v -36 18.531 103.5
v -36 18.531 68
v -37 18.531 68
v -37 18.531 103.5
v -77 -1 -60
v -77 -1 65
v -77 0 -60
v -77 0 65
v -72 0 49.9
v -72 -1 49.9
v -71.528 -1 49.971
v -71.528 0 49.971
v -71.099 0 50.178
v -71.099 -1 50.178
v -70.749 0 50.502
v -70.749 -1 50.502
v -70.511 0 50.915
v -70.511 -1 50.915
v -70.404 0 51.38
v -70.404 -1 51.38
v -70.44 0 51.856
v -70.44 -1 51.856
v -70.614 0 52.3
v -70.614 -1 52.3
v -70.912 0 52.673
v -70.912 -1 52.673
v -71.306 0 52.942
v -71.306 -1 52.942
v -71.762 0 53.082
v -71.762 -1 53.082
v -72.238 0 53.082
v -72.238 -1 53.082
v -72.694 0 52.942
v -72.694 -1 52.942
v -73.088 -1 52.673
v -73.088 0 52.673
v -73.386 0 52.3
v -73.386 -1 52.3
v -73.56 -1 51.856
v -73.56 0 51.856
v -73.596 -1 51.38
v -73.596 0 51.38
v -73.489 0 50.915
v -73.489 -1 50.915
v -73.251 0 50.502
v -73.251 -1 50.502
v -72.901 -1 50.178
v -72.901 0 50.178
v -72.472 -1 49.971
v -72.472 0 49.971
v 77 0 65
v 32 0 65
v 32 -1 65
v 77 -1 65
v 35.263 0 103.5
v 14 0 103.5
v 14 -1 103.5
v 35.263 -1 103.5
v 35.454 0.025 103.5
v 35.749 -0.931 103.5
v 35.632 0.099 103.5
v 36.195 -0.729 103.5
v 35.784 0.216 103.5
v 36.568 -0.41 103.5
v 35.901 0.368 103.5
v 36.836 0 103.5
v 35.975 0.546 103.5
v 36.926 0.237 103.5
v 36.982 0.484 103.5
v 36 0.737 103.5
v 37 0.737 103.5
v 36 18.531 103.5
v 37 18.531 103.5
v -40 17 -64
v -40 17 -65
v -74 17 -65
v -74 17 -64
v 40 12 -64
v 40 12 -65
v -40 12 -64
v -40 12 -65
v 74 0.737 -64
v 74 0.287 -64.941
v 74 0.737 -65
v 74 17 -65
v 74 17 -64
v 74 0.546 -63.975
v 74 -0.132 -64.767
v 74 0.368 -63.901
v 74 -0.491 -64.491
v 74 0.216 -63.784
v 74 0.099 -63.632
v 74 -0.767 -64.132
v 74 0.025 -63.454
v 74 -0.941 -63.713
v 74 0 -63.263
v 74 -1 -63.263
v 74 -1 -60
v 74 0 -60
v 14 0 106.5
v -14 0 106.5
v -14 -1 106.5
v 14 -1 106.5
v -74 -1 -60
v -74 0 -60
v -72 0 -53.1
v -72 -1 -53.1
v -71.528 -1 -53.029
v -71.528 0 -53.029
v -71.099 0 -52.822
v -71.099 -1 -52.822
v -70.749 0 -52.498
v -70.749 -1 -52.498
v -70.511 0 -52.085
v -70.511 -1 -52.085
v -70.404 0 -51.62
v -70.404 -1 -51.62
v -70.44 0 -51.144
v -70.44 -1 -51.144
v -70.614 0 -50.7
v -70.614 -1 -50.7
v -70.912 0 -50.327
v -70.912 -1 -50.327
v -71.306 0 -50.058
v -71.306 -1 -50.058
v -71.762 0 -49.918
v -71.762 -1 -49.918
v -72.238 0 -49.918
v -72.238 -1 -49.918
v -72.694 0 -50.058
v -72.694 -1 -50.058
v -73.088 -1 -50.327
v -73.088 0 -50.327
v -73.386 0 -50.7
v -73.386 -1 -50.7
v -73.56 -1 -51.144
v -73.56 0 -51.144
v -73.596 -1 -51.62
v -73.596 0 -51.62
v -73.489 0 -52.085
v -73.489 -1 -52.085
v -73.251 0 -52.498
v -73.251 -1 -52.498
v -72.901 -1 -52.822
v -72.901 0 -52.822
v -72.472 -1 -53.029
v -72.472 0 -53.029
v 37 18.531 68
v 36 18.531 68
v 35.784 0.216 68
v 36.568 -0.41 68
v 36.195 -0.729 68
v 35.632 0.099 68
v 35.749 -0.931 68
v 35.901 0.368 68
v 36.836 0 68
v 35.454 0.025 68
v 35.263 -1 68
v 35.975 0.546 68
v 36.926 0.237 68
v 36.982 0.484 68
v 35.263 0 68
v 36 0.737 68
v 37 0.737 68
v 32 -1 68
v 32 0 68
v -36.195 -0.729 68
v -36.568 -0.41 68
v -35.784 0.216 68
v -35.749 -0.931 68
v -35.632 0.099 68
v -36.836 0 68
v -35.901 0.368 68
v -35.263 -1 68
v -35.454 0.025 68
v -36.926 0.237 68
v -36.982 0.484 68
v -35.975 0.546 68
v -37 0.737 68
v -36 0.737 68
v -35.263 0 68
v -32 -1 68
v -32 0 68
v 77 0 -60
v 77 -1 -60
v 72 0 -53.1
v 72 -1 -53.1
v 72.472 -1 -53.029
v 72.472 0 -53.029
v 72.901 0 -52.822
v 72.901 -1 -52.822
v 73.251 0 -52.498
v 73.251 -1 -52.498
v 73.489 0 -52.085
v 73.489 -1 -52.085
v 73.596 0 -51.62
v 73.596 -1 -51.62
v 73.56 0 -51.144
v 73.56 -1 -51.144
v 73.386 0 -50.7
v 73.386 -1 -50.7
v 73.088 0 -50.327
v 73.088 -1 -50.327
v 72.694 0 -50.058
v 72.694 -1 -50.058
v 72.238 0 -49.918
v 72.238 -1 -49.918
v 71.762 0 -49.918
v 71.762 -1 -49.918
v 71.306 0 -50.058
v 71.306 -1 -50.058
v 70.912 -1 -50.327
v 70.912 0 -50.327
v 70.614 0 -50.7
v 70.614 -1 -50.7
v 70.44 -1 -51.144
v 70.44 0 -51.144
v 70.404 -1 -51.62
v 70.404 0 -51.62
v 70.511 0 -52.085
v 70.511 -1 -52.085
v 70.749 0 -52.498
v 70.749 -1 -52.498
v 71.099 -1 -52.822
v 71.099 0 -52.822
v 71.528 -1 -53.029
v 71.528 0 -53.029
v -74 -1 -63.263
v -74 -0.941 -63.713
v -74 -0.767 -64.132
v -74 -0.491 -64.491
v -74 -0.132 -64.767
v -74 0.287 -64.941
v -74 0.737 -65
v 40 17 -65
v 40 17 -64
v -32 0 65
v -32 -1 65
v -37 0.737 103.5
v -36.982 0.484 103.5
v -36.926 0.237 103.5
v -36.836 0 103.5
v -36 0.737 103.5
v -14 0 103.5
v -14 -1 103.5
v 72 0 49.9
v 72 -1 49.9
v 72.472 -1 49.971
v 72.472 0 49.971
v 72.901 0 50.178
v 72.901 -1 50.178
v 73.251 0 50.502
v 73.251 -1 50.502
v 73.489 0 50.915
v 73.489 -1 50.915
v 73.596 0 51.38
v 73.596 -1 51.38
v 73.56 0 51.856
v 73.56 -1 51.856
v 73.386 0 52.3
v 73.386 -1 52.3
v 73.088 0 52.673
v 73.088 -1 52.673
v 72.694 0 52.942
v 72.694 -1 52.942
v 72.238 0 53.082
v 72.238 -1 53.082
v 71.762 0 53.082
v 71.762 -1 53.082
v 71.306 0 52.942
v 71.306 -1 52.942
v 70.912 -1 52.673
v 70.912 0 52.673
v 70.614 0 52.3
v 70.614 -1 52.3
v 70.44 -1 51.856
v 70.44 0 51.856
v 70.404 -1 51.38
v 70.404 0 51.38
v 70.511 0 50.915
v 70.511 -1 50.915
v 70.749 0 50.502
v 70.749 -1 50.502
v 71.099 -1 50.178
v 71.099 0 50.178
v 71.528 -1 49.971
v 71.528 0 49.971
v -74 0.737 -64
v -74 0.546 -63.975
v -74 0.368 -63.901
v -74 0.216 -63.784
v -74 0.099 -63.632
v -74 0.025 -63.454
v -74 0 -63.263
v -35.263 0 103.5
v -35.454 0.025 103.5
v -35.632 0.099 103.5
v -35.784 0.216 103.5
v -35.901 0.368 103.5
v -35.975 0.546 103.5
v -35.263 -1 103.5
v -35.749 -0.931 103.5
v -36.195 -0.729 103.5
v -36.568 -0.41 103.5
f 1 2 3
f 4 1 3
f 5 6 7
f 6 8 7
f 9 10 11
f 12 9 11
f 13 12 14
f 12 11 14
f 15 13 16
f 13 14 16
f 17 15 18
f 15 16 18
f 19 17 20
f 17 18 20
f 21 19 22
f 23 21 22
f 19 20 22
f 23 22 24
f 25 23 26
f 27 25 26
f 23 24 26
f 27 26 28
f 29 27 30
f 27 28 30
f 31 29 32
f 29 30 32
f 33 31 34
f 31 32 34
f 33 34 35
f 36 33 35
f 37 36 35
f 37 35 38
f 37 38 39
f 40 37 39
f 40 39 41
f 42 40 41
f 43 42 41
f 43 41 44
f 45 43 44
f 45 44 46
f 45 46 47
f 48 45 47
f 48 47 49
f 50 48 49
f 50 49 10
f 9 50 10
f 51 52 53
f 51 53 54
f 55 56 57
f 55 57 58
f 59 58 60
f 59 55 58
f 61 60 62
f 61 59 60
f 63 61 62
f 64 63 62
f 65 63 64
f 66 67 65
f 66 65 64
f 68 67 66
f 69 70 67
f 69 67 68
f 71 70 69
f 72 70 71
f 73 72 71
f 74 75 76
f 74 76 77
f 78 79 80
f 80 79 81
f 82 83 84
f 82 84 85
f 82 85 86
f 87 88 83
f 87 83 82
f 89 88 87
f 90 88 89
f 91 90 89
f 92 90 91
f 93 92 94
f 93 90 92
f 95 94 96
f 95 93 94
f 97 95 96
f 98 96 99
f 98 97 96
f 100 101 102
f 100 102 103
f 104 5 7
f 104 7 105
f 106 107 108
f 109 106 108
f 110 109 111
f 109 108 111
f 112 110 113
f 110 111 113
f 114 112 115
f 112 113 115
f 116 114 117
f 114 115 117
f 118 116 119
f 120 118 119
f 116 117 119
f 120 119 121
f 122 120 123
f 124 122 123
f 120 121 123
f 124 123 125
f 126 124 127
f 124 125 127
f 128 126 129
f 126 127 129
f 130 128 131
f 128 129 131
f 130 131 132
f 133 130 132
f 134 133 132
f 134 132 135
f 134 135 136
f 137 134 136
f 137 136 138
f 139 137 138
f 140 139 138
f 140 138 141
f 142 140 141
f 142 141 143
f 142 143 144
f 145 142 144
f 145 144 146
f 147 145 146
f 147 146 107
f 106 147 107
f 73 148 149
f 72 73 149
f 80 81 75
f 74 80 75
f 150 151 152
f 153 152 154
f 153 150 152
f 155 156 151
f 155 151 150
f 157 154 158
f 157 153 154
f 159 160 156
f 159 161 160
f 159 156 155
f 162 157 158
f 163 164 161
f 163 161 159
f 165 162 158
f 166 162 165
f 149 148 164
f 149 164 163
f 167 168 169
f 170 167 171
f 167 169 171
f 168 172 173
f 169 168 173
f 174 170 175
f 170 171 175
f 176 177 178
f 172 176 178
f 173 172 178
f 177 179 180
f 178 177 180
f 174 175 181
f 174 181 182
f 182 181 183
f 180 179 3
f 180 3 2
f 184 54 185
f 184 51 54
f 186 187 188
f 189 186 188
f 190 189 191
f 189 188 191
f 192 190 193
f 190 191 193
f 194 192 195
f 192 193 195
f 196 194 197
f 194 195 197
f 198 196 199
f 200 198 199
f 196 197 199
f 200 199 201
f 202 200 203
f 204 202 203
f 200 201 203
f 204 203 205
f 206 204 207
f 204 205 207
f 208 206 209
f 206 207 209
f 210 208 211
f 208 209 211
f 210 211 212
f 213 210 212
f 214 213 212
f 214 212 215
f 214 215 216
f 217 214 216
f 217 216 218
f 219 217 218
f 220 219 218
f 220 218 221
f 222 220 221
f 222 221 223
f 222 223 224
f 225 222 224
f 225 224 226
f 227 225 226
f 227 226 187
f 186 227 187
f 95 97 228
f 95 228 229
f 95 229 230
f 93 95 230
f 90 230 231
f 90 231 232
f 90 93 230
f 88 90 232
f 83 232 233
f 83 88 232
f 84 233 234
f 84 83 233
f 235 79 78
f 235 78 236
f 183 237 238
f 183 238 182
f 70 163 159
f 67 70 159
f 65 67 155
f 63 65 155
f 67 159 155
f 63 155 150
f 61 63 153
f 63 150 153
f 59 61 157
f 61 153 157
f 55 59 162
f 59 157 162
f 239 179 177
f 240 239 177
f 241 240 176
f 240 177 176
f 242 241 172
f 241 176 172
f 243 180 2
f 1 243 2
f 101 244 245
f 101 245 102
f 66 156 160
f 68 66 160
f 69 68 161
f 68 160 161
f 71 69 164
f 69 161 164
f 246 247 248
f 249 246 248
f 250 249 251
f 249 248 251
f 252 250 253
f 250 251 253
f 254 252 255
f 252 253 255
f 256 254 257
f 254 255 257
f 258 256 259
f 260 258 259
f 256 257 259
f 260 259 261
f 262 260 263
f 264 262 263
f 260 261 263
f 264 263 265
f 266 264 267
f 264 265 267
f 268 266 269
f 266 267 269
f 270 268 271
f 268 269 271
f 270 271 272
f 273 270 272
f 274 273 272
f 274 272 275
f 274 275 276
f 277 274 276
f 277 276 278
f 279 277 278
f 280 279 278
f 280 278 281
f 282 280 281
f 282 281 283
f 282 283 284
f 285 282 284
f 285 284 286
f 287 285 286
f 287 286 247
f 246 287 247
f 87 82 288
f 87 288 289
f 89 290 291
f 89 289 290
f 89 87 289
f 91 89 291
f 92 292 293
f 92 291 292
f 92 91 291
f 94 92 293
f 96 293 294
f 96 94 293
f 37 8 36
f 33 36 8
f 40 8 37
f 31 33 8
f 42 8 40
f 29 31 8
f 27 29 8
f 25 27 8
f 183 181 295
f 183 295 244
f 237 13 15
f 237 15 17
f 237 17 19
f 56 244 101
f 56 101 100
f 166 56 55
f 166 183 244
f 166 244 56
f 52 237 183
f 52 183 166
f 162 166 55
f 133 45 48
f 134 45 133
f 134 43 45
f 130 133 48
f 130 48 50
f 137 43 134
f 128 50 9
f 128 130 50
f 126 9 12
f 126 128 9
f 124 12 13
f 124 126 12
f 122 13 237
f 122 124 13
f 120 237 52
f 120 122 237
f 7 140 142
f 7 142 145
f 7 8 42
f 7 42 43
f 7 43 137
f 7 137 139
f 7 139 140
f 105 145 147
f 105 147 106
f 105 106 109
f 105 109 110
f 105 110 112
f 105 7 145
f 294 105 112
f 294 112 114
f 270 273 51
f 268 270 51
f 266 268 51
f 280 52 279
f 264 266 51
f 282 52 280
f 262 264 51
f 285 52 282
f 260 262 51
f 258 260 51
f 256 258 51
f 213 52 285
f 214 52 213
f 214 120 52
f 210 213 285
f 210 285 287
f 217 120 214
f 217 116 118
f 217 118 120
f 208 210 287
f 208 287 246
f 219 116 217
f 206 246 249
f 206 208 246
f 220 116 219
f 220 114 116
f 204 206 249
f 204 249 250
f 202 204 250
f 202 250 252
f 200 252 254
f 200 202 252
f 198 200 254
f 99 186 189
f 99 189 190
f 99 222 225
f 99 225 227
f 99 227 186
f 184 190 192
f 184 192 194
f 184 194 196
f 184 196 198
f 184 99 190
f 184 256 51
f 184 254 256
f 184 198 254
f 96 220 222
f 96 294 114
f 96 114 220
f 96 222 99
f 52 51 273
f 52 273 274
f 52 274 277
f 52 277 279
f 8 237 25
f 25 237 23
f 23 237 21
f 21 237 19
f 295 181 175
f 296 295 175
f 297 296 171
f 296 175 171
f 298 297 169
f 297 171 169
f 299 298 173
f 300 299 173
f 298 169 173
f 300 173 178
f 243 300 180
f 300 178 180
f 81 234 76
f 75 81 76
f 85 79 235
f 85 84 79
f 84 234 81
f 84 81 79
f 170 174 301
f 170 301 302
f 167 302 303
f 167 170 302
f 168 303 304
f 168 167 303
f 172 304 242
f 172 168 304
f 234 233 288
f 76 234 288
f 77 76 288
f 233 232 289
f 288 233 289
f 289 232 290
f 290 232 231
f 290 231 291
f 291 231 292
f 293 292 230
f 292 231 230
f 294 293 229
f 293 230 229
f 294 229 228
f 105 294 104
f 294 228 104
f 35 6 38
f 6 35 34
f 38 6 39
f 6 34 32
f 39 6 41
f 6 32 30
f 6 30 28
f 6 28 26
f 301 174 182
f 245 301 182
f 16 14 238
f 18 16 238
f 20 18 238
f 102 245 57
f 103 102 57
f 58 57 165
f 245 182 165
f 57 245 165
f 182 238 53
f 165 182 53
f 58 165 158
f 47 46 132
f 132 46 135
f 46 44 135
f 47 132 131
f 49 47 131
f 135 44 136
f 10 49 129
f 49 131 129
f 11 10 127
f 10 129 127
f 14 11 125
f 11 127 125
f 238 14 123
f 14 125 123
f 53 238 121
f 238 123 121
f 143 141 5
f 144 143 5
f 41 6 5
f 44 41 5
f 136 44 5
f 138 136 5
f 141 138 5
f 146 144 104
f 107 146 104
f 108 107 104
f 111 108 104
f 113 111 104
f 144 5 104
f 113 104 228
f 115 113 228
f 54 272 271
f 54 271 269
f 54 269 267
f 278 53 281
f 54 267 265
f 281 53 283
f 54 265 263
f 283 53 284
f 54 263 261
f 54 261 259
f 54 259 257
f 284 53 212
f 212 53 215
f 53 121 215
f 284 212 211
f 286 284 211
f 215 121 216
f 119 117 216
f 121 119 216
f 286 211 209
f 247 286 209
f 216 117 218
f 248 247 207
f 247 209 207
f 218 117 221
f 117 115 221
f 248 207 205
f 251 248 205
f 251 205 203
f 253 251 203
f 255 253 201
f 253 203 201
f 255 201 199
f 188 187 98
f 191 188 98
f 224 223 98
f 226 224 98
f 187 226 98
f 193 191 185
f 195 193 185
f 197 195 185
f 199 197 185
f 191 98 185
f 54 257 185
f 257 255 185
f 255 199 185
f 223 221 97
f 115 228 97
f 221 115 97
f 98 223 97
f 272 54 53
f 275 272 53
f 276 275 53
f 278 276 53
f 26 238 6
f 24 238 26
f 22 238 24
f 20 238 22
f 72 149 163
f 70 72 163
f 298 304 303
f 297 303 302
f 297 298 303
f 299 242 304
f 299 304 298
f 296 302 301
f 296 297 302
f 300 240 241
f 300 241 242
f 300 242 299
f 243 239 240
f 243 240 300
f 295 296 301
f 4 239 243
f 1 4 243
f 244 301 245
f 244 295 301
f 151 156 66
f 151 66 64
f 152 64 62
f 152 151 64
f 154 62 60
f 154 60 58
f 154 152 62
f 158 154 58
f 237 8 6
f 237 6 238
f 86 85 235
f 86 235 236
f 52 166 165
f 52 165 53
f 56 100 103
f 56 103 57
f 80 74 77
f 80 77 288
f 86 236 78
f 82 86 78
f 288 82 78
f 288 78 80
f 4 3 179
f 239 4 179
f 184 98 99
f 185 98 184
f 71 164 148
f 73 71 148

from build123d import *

# Parameters (mm, degrees)
SM_BASE_FLANGE_1_DEPTH           = 1
OTHER_START                      = 68
OTHER_4_DEPTH                    = 35.5
OTHER_4_2_DEPTH                  = 35.5
CUT_EXTRUDE_1_REACH              = 134.863
SKETCH_10_R                      = 1.6
SM_EDGE_FLANGE_1_STRIP_W         = 5.4732
SM_EDGE_FLANGE_1_STRIP_H         = 1
SM_EDGE_FLANGE_1_STRIP_CUT_DEPTH = 154
SM_EDGE_FLANGE_1_DEPTH           = 154
SKETCH_14_W                      = 9.264116278
SKETCH_14_H                      = 12.510211191
CUT_EXTRUDE_2_DEPTH              = 133.863464967
CUT_EXTRUDE_3_REACH              = 190.904
SKETCH_15_W                      = 80
SKETCH_15_H                      = 29.662460086


# Read off the part's stored shape, not the designer's step: 绘制的折弯4
# Sheet-metal steps are written as plain solids
with BuildPart() as part:
    # Sketch 1 → 基体-法兰1 (new body)
    with BuildSketch(Plane(origin=(0, 0, 0), x_dir=(1, 0, 0), z_dir=(0, 1, 0))):
        Polygon((0.031889959, 65), (-77, 65), (-77, -65), (-32, -65), (-32, -68), (-55, -68), (-55, -103.5), (-14, -103.5), (-14, -106.5), (14, -106.5), (14, -103.5), (55, -103.5), (55, -68), (32, -68), (32, -65), (77, -65), (77, 65), align=None)
    extrude(amount=-SM_BASE_FLANGE_1_DEPTH)

    # Other 4 outline → Other 4 (cut)
    with BuildSketch(Plane.XY.offset(OTHER_START)):
        with BuildLine():
            Line((-55, -1), (-35.2634, -1))
            ThreePointArc((-35.2634, -1), (-36.195226164, -0.728828115), (-36.83604109, 0))
            Line((-36.83604109, 0), (-55, 0))
            Line((-55, 0), (-55, -1))
        make_face()
        with BuildLine():
            ThreePointArc((36.83604109, 0), (36.195226164, -0.728828115), (35.2634, -1))
            Line((35.2634, -1), (55, -1))
            Line((55, -1), (55, 0))
            Line((55, 0), (36.83604109, 0))
        make_face()
    extrude(amount=OTHER_4_DEPTH, mode=Mode.SUBTRACT)

    # Other 4 2 outline → Other 4 2 (add)
    with BuildSketch(Plane.XY.offset(OTHER_START)):
        with BuildLine():
            ThreePointArc((-37, 0.7366), (-36.958514757, 0.359286442), (-36.83604109, 0))
            Line((-36.83604109, 0), (-35.2634, 0))
            ThreePointArc((-35.2634, 0), (-35.784254855, 0.215745145), (-36, 0.7366))
            Line((-36, 0.7366), (-36, 18.530753262))
            Line((-36, 18.530753262), (-37, 18.530753262))
            Line((-37, 18.530753262), (-37, 0.7366))
        make_face()
        with BuildLine():
            Line((35.2634, 0), (36.83604109, 0))
            ThreePointArc((36.83604109, 0), (36.958514757, 0.359286442), (37, 0.7366))
            Line((37, 0.7366), (37, 18.530753262))
            Line((37, 18.530753262), (36, 18.530753262))
            Line((36, 18.530753262), (36, 0.7366))
            ThreePointArc((36, 0.7366), (35.784254855, 0.215745145), (35.2634, 0))
        make_face()
    extrude(amount=OTHER_4_2_DEPTH)

    # 草图10 → 切除-拉伸1 (cut, up to next)
    with BuildSketch(Plane.XZ.offset(1), mode=Mode.PRIVATE) as cut_extrude_1_sk1:
        with Locations(Location((-72, -51.5, 0), (0, 0, 270))):
            Circle(SKETCH_10_R)
    cut_extrude_1_tool1 = extrude(cut_extrude_1_sk1.sketch, amount=-CUT_EXTRUDE_1_REACH, mode=Mode.PRIVATE) & part.part
    # 草图10 → 切除-拉伸1 (cut, up to next)
    with BuildSketch(Plane.XZ.offset(1), mode=Mode.PRIVATE) as cut_extrude_1_sk2:
        with Locations(Location((-72, 51.5, 0), (0, 0, 270))):
            Circle(SKETCH_10_R)
    cut_extrude_1_tool2 = extrude(cut_extrude_1_sk2.sketch, amount=-CUT_EXTRUDE_1_REACH, mode=Mode.PRIVATE) & part.part
    # 草图10 → 切除-拉伸1 (cut, up to next)
    with BuildSketch(Plane.XZ.offset(1), mode=Mode.PRIVATE) as cut_extrude_1_sk3:
        with Locations(Location((72, -51.5, 0), (0, 0, 270))):
            Circle(SKETCH_10_R)
    cut_extrude_1_tool3 = extrude(cut_extrude_1_sk3.sketch, amount=-CUT_EXTRUDE_1_REACH, mode=Mode.PRIVATE) & part.part
    # 草图10 → 切除-拉伸1 (cut, up to next)
    with BuildSketch(Plane.XZ.offset(1), mode=Mode.PRIVATE) as cut_extrude_1_sk4:
        with Locations(Location((72, 51.5, 0), (0, 0, 270))):
            Circle(SKETCH_10_R)
    cut_extrude_1_tool4 = extrude(cut_extrude_1_sk4.sketch, amount=-CUT_EXTRUDE_1_REACH, mode=Mode.PRIVATE) & part.part
    add(cut_extrude_1_tool1.solids().sort_by_distance((-72, -1, -51.5))[0], mode=Mode.SUBTRACT)
    add(cut_extrude_1_tool2.solids().sort_by_distance((-72, -1, 51.5))[0], mode=Mode.SUBTRACT)
    add(cut_extrude_1_tool3.solids().sort_by_distance((72, -1, -51.5))[0], mode=Mode.SUBTRACT)
    add(cut_extrude_1_tool4.solids().sort_by_distance((72, -1, 51.5))[0], mode=Mode.SUBTRACT)

    # 边线-法兰1 strip (across the edge) → 边线-法兰1 strip cut (cut)
    with BuildSketch(Plane(origin=(77, 0, -65), x_dir=(0, 0, 1), z_dir=(-1, 0, 0))):
        with Locations((-1, -0.5)):
            Rectangle(SM_EDGE_FLANGE_1_STRIP_W, SM_EDGE_FLANGE_1_STRIP_H)
    extrude(amount=SM_EDGE_FLANGE_1_STRIP_CUT_DEPTH, mode=Mode.SUBTRACT)

    # 边线-法兰1 section (across the edge) → 边线-法兰1 (add)
    with BuildSketch(Plane(origin=(77, 0, -65), x_dir=(0, 0, 1), z_dir=(-1, 0, 0))):
        with BuildLine():
            Line((0, 0.7366), (0, 17))
            Line((0, 17), (1, 17))
            Line((1, 17), (1, 0.7366))
            ThreePointArc((1, 0.7366), (1.215745145, 0.215745145), (1.7366, 0))
            Line((1.7366, 0), (1.7366, -1))
            ThreePointArc((1.7366, -1), (0.508638364, -0.491361636), (0, 0.7366))
        make_face()
    extrude(amount=SM_EDGE_FLANGE_1_DEPTH)

    # 草图14 → 切除-拉伸2 (cut, through all)
    with BuildSketch(Plane.XZ.offset(1)):
        with Locations((-78.632058139, -66.255105596)):
            Rectangle(SKETCH_14_W, SKETCH_14_H)
        with Locations((78.632058139, -66.255105596)):
            Rectangle(SKETCH_14_W, SKETCH_14_H)
    extrude(amount=-CUT_EXTRUDE_2_DEPTH, mode=Mode.SUBTRACT)

    # 草图15 → 切除-拉伸3 (cut, up to next)
    with BuildSketch(Plane(origin=(0, 0, -65), x_dir=(-1, 0, 0), z_dir=(0, 0, -1)), mode=Mode.PRIVATE) as cut_extrude_3_sk1:
        with Locations((0, 26.831230043)):
            Rectangle(SKETCH_15_W, SKETCH_15_H)
    cut_extrude_3_tool1 = extrude(cut_extrude_3_sk1.sketch, amount=-CUT_EXTRUDE_3_REACH, mode=Mode.PRIVATE) & part.part
    add(cut_extrude_3_tool1.solids().sort_by_distance((0, 26.83123, -65))[0], mode=Mode.SUBTRACT)


solid = part.part
